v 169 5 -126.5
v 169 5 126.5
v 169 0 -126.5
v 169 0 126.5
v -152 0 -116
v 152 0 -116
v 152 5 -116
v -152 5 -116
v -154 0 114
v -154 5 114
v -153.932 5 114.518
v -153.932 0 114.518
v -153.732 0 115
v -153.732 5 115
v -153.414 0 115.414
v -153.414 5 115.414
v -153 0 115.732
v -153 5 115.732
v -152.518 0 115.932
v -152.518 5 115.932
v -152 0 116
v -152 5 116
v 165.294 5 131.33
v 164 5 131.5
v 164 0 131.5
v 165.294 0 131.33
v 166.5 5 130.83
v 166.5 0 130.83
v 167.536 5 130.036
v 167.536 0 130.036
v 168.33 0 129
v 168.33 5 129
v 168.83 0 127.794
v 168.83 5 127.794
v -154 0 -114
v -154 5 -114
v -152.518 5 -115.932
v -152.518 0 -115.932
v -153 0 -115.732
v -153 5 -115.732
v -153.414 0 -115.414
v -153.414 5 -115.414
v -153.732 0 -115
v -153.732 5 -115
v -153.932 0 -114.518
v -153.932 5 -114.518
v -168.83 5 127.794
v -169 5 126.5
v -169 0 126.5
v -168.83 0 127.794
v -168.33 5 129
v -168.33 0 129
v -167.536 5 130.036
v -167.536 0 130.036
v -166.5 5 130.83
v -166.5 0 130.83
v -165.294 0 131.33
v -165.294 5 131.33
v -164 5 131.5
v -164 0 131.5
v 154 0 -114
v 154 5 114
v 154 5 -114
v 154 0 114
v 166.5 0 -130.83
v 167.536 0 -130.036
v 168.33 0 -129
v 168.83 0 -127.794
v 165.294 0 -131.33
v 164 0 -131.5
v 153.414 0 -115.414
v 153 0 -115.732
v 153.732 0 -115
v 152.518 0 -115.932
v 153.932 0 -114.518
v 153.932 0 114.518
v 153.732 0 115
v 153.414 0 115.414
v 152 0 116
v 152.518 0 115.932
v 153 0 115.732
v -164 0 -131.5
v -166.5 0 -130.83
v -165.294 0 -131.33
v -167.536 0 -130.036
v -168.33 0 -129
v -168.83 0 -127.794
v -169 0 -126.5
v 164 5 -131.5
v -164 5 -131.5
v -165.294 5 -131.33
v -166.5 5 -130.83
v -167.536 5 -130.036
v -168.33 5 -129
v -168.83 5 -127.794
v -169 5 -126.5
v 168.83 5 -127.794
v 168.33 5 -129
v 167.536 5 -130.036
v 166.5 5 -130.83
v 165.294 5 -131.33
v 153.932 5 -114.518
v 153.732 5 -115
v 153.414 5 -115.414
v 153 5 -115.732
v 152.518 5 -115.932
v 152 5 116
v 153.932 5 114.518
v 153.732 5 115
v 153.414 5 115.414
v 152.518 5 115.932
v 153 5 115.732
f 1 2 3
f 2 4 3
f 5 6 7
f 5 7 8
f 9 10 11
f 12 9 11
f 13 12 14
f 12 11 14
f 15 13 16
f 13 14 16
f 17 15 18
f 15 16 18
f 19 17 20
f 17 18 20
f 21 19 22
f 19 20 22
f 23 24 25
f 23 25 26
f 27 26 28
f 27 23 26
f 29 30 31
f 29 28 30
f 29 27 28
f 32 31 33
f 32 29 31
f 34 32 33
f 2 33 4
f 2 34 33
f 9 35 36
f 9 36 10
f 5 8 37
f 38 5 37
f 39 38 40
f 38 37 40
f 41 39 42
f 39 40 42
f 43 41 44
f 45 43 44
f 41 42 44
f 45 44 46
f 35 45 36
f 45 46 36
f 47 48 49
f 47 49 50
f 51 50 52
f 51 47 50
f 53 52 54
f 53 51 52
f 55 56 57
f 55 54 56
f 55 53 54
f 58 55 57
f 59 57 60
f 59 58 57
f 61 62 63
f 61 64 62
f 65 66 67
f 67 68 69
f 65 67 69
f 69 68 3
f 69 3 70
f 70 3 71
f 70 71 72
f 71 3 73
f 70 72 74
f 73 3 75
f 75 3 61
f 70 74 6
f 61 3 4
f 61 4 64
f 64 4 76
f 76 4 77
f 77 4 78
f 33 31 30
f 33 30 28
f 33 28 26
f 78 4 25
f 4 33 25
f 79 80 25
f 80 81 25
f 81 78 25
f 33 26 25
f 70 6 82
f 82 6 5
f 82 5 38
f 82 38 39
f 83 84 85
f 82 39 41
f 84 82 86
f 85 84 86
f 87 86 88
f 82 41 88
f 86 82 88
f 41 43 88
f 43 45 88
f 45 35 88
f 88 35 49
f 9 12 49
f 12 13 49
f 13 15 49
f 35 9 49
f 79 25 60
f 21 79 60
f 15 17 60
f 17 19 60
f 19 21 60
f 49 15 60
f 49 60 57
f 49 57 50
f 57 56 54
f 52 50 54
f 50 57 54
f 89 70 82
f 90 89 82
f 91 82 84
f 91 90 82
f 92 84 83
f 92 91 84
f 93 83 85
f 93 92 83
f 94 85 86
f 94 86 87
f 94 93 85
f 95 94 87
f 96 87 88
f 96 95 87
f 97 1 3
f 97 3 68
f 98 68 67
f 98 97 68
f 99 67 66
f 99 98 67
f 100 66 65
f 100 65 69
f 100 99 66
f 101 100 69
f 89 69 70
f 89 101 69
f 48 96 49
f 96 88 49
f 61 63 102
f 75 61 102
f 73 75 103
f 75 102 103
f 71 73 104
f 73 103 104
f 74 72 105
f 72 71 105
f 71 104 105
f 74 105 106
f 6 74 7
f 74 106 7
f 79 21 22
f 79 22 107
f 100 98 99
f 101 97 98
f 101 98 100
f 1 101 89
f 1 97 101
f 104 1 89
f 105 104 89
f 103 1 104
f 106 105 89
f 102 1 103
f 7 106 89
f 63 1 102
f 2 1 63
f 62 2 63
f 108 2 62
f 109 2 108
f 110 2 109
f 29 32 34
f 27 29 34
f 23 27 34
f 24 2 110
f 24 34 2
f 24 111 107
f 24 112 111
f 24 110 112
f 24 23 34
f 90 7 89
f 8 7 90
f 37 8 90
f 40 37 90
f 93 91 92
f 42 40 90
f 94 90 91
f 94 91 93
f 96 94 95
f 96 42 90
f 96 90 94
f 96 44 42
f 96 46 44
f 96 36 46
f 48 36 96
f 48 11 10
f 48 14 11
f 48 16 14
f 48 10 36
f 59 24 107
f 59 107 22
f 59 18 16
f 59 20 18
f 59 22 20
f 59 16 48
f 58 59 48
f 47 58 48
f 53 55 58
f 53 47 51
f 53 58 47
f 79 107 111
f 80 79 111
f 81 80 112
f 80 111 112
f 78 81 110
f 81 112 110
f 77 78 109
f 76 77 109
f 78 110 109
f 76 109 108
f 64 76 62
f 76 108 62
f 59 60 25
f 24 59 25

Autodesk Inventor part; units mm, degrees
ref_plane "YZ Plane" through (0, 0, 0) normal (1, 0, 0) x (0, 1, 0)
ref_plane "XZ Plane" through (0, 0, 0) normal (0, 1, 0) x (-1, 0, 0)
ref_plane "XY Plane" through (0, 0, 0) normal (0, 0, 1) x (1, 0, 0)
sketch "Szkic1" plane through (0, 0, 0) normal (0, 1, 0) x (-1, 0, 0)
  line L0 (-169, -131.5) -> (169, -131.5)
  line L1 (169, -131.5) -> (169, 131.5)
  line L2 (169, 131.5) -> (-169, 131.5)
  line L3 (-169, 131.5) -> (-169, -131.5)
  line L4 (-169, -131.5) -> (169, 131.5) construction
  line L5 (169, -131.5) -> (-169, 131.5) construction
  point P0 (0, 0)
  dimension "d0" = 338
  dimension "d1" = 263
extrude "Wyciągnięcie proste1" add sketch "Szkic1" along normal blind 5
sketch "Szkic2" plane through (0, 0, 0) normal (0, -1, 0) x (1, 0, 0)
  line L0 (154, -116) -> (-154, -116)
  line L1 (-154, -116) -> (-154, 116)
  line L2 (-154, 116) -> (154, 116)
  line L3 (154, 116) -> (154, -116)
  line L4 (154, -116) -> (-154, 116) construction
  line L5 (-154, -116) -> (154, 116) construction
  point P0 (0, 0)
  dimension "d4" = 308
  dimension "d5" = 232
extrude "Wyciągnięcie proste2" cut sketch "Szkic2" against normal blind 10
fillet "Zaokrąglenie1" radius 2 4 edges at (-154, 2.5, 116) (-154, 2.5, -116) (154, 2.5, 116) (154, 2.5, -116)
fillet "Zaokrąglenie2" radius 5 4 edges at (169, 2.5, -131.5) (-169, 2.5, -131.5) (169, 2.5, 131.5) (-169, 2.5, 131.5)
properties part number "frame_upper" material "Tworzywo sztuczne PMMA"
